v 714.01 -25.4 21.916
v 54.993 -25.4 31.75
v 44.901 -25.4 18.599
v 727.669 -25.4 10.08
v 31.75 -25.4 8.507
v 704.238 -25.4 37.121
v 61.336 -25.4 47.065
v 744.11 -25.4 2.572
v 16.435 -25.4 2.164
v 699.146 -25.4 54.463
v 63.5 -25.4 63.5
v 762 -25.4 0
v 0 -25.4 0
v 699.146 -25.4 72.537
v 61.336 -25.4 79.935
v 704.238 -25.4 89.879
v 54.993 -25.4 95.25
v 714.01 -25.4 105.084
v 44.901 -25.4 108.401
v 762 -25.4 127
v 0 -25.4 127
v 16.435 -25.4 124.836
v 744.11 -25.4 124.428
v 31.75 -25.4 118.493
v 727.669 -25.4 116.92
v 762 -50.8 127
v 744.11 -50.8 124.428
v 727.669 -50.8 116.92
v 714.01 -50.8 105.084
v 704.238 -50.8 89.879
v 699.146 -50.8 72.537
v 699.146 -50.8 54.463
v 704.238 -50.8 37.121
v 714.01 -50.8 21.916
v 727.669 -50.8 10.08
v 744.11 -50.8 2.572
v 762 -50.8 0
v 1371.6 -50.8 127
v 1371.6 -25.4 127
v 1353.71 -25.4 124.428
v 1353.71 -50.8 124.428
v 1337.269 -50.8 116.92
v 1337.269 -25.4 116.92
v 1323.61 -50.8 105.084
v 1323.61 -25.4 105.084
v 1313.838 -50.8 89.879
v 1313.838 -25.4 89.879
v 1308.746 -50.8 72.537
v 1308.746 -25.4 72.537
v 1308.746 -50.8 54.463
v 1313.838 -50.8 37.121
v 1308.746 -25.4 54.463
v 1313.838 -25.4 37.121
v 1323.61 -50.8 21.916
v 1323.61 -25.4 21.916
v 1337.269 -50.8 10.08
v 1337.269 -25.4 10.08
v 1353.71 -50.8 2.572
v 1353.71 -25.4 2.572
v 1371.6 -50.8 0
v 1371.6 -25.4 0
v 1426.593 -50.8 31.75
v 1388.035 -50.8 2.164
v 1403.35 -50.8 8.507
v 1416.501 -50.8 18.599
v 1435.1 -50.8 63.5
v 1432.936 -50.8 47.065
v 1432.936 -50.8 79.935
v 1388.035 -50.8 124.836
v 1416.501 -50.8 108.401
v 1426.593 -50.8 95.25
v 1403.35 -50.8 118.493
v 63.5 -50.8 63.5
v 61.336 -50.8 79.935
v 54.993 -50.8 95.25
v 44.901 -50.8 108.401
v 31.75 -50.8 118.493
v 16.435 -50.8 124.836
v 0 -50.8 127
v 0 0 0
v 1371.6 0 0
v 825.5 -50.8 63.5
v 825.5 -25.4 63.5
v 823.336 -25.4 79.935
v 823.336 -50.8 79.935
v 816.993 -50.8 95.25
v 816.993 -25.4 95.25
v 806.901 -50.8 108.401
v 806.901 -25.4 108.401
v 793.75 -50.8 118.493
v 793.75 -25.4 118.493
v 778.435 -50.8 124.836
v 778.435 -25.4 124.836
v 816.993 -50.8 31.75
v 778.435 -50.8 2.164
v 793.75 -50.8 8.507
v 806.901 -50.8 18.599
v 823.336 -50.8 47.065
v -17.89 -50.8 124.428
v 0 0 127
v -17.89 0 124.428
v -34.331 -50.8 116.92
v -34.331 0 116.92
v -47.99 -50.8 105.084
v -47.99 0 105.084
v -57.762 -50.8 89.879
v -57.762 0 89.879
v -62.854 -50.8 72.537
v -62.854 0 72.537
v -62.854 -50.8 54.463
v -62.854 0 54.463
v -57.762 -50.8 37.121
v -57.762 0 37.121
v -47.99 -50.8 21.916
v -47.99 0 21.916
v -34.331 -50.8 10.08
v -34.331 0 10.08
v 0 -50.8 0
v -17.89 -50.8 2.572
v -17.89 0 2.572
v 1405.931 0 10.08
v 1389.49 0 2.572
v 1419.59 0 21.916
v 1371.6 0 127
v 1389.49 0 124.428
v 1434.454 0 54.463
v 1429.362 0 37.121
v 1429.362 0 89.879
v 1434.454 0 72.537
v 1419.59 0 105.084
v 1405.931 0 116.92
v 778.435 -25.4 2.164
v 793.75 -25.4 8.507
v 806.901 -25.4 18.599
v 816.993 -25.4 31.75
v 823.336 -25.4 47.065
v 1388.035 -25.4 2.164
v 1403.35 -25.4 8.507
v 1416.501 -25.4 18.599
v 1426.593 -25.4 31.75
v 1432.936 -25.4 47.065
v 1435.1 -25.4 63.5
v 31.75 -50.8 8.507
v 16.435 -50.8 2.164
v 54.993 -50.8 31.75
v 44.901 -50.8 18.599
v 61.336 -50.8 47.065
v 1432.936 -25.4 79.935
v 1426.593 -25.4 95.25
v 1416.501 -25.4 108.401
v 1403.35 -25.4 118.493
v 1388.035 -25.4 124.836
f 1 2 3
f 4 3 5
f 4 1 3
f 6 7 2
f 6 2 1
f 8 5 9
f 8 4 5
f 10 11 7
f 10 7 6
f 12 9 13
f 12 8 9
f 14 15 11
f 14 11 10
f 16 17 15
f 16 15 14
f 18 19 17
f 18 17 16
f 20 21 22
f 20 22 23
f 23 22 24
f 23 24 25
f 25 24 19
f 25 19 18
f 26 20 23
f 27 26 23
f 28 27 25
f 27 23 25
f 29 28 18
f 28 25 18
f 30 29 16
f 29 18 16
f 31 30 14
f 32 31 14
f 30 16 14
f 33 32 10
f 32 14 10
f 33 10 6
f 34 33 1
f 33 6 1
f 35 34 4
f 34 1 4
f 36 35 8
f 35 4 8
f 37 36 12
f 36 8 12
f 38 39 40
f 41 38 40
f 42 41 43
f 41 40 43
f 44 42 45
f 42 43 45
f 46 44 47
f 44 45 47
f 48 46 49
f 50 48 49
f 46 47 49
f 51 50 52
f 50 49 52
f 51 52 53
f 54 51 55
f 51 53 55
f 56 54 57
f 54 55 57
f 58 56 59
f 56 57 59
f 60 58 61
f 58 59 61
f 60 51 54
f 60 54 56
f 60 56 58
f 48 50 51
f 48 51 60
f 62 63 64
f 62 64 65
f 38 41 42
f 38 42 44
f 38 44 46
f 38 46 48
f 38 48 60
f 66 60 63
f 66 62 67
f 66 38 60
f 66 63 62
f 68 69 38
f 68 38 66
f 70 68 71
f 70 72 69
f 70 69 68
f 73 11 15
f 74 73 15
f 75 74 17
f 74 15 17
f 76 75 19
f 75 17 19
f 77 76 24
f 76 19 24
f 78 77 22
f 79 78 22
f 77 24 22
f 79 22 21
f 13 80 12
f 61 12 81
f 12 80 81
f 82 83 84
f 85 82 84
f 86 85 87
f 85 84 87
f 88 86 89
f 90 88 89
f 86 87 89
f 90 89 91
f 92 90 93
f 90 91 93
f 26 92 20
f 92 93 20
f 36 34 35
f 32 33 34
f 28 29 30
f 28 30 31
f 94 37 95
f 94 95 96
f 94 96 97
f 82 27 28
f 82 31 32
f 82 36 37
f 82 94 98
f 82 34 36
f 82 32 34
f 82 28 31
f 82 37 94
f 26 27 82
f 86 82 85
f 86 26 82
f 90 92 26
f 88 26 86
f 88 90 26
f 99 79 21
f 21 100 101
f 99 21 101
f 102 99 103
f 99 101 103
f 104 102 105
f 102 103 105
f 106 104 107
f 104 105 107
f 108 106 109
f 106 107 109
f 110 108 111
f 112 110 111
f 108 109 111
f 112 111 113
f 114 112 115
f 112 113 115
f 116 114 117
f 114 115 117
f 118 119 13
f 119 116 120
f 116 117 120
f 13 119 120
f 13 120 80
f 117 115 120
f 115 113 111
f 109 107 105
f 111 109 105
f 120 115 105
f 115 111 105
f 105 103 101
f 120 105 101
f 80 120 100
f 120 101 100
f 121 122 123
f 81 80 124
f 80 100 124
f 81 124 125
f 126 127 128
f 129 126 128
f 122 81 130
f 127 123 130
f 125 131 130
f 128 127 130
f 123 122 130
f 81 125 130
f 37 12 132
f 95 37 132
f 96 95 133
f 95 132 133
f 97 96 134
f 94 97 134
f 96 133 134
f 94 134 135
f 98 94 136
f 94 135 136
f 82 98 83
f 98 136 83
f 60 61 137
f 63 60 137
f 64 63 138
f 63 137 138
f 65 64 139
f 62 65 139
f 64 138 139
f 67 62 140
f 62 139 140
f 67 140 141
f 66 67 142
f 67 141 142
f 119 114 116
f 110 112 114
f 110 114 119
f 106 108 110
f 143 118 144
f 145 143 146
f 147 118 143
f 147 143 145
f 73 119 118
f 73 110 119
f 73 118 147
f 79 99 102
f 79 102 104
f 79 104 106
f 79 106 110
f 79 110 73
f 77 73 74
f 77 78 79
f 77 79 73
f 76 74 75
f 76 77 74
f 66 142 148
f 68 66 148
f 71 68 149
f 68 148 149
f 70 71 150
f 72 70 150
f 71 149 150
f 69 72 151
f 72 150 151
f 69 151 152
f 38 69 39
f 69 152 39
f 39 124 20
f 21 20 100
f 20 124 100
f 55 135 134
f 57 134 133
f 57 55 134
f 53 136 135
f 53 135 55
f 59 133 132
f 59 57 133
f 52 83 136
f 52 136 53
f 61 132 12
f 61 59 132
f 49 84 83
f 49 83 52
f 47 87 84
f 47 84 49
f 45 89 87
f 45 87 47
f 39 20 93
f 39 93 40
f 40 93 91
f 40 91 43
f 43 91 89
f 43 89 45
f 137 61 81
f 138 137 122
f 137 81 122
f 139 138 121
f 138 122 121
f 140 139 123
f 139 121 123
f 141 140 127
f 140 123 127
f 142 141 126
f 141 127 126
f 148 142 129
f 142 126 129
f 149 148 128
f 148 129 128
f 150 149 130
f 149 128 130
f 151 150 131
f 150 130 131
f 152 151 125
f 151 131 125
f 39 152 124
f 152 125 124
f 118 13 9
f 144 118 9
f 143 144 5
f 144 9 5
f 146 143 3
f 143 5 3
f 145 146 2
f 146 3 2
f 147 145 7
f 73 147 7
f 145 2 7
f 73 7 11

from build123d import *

# Parameters (mm, degrees)
F1_DEPTH = 25.4
F3_DEPTH = 25.4


with BuildPart() as f1:
    # F0 (on Front) → F1 (new body)
    with BuildSketch(Plane.XZ):
        with BuildLine():
            ThreePointArc((0, 127), (-63.5, 63.5), (0, 0))
            Line((0, 0), (1371.6, 0))
            ThreePointArc((1371.6, 0), (1435.1, 63.5), (1371.6, 127))
            Line((1371.6, 127), (0, 127))
        make_face()
    extrude(amount=F1_DEPTH)

    # F2 (on face) → F3 (join)
    with BuildSketch(Plane.XZ.offset(25.4)):
        with BuildLine():
            ThreePointArc((0, 0), (44.901281, 18.598719), (63.5, 63.5))
            ThreePointArc((63.5, 63.5), (44.901281, 108.401281), (0, 127))
            ThreePointArc((0, 127), (-63.5, 63.5), (0, 0))
        make_face()
        with BuildLine():
            ThreePointArc((825.5, 63.5), (806.901281, 108.401281), (762, 127))
            ThreePointArc((762, 127), (698.5, 63.5), (762, 0))
            ThreePointArc((762, 0), (806.901281, 18.598719), (825.5, 63.5))
        make_face()
        with BuildLine():
            ThreePointArc((1435.1, 63.5), (1416.501281, 108.401281), (1371.6, 127))
            ThreePointArc((1371.6, 127), (1308.1, 63.5), (1371.6, 0))
            ThreePointArc((1371.6, 0), (1416.501281, 18.598719), (1435.1, 63.5))
        make_face()
    extrude(amount=F3_DEPTH)


solid = f1.part
